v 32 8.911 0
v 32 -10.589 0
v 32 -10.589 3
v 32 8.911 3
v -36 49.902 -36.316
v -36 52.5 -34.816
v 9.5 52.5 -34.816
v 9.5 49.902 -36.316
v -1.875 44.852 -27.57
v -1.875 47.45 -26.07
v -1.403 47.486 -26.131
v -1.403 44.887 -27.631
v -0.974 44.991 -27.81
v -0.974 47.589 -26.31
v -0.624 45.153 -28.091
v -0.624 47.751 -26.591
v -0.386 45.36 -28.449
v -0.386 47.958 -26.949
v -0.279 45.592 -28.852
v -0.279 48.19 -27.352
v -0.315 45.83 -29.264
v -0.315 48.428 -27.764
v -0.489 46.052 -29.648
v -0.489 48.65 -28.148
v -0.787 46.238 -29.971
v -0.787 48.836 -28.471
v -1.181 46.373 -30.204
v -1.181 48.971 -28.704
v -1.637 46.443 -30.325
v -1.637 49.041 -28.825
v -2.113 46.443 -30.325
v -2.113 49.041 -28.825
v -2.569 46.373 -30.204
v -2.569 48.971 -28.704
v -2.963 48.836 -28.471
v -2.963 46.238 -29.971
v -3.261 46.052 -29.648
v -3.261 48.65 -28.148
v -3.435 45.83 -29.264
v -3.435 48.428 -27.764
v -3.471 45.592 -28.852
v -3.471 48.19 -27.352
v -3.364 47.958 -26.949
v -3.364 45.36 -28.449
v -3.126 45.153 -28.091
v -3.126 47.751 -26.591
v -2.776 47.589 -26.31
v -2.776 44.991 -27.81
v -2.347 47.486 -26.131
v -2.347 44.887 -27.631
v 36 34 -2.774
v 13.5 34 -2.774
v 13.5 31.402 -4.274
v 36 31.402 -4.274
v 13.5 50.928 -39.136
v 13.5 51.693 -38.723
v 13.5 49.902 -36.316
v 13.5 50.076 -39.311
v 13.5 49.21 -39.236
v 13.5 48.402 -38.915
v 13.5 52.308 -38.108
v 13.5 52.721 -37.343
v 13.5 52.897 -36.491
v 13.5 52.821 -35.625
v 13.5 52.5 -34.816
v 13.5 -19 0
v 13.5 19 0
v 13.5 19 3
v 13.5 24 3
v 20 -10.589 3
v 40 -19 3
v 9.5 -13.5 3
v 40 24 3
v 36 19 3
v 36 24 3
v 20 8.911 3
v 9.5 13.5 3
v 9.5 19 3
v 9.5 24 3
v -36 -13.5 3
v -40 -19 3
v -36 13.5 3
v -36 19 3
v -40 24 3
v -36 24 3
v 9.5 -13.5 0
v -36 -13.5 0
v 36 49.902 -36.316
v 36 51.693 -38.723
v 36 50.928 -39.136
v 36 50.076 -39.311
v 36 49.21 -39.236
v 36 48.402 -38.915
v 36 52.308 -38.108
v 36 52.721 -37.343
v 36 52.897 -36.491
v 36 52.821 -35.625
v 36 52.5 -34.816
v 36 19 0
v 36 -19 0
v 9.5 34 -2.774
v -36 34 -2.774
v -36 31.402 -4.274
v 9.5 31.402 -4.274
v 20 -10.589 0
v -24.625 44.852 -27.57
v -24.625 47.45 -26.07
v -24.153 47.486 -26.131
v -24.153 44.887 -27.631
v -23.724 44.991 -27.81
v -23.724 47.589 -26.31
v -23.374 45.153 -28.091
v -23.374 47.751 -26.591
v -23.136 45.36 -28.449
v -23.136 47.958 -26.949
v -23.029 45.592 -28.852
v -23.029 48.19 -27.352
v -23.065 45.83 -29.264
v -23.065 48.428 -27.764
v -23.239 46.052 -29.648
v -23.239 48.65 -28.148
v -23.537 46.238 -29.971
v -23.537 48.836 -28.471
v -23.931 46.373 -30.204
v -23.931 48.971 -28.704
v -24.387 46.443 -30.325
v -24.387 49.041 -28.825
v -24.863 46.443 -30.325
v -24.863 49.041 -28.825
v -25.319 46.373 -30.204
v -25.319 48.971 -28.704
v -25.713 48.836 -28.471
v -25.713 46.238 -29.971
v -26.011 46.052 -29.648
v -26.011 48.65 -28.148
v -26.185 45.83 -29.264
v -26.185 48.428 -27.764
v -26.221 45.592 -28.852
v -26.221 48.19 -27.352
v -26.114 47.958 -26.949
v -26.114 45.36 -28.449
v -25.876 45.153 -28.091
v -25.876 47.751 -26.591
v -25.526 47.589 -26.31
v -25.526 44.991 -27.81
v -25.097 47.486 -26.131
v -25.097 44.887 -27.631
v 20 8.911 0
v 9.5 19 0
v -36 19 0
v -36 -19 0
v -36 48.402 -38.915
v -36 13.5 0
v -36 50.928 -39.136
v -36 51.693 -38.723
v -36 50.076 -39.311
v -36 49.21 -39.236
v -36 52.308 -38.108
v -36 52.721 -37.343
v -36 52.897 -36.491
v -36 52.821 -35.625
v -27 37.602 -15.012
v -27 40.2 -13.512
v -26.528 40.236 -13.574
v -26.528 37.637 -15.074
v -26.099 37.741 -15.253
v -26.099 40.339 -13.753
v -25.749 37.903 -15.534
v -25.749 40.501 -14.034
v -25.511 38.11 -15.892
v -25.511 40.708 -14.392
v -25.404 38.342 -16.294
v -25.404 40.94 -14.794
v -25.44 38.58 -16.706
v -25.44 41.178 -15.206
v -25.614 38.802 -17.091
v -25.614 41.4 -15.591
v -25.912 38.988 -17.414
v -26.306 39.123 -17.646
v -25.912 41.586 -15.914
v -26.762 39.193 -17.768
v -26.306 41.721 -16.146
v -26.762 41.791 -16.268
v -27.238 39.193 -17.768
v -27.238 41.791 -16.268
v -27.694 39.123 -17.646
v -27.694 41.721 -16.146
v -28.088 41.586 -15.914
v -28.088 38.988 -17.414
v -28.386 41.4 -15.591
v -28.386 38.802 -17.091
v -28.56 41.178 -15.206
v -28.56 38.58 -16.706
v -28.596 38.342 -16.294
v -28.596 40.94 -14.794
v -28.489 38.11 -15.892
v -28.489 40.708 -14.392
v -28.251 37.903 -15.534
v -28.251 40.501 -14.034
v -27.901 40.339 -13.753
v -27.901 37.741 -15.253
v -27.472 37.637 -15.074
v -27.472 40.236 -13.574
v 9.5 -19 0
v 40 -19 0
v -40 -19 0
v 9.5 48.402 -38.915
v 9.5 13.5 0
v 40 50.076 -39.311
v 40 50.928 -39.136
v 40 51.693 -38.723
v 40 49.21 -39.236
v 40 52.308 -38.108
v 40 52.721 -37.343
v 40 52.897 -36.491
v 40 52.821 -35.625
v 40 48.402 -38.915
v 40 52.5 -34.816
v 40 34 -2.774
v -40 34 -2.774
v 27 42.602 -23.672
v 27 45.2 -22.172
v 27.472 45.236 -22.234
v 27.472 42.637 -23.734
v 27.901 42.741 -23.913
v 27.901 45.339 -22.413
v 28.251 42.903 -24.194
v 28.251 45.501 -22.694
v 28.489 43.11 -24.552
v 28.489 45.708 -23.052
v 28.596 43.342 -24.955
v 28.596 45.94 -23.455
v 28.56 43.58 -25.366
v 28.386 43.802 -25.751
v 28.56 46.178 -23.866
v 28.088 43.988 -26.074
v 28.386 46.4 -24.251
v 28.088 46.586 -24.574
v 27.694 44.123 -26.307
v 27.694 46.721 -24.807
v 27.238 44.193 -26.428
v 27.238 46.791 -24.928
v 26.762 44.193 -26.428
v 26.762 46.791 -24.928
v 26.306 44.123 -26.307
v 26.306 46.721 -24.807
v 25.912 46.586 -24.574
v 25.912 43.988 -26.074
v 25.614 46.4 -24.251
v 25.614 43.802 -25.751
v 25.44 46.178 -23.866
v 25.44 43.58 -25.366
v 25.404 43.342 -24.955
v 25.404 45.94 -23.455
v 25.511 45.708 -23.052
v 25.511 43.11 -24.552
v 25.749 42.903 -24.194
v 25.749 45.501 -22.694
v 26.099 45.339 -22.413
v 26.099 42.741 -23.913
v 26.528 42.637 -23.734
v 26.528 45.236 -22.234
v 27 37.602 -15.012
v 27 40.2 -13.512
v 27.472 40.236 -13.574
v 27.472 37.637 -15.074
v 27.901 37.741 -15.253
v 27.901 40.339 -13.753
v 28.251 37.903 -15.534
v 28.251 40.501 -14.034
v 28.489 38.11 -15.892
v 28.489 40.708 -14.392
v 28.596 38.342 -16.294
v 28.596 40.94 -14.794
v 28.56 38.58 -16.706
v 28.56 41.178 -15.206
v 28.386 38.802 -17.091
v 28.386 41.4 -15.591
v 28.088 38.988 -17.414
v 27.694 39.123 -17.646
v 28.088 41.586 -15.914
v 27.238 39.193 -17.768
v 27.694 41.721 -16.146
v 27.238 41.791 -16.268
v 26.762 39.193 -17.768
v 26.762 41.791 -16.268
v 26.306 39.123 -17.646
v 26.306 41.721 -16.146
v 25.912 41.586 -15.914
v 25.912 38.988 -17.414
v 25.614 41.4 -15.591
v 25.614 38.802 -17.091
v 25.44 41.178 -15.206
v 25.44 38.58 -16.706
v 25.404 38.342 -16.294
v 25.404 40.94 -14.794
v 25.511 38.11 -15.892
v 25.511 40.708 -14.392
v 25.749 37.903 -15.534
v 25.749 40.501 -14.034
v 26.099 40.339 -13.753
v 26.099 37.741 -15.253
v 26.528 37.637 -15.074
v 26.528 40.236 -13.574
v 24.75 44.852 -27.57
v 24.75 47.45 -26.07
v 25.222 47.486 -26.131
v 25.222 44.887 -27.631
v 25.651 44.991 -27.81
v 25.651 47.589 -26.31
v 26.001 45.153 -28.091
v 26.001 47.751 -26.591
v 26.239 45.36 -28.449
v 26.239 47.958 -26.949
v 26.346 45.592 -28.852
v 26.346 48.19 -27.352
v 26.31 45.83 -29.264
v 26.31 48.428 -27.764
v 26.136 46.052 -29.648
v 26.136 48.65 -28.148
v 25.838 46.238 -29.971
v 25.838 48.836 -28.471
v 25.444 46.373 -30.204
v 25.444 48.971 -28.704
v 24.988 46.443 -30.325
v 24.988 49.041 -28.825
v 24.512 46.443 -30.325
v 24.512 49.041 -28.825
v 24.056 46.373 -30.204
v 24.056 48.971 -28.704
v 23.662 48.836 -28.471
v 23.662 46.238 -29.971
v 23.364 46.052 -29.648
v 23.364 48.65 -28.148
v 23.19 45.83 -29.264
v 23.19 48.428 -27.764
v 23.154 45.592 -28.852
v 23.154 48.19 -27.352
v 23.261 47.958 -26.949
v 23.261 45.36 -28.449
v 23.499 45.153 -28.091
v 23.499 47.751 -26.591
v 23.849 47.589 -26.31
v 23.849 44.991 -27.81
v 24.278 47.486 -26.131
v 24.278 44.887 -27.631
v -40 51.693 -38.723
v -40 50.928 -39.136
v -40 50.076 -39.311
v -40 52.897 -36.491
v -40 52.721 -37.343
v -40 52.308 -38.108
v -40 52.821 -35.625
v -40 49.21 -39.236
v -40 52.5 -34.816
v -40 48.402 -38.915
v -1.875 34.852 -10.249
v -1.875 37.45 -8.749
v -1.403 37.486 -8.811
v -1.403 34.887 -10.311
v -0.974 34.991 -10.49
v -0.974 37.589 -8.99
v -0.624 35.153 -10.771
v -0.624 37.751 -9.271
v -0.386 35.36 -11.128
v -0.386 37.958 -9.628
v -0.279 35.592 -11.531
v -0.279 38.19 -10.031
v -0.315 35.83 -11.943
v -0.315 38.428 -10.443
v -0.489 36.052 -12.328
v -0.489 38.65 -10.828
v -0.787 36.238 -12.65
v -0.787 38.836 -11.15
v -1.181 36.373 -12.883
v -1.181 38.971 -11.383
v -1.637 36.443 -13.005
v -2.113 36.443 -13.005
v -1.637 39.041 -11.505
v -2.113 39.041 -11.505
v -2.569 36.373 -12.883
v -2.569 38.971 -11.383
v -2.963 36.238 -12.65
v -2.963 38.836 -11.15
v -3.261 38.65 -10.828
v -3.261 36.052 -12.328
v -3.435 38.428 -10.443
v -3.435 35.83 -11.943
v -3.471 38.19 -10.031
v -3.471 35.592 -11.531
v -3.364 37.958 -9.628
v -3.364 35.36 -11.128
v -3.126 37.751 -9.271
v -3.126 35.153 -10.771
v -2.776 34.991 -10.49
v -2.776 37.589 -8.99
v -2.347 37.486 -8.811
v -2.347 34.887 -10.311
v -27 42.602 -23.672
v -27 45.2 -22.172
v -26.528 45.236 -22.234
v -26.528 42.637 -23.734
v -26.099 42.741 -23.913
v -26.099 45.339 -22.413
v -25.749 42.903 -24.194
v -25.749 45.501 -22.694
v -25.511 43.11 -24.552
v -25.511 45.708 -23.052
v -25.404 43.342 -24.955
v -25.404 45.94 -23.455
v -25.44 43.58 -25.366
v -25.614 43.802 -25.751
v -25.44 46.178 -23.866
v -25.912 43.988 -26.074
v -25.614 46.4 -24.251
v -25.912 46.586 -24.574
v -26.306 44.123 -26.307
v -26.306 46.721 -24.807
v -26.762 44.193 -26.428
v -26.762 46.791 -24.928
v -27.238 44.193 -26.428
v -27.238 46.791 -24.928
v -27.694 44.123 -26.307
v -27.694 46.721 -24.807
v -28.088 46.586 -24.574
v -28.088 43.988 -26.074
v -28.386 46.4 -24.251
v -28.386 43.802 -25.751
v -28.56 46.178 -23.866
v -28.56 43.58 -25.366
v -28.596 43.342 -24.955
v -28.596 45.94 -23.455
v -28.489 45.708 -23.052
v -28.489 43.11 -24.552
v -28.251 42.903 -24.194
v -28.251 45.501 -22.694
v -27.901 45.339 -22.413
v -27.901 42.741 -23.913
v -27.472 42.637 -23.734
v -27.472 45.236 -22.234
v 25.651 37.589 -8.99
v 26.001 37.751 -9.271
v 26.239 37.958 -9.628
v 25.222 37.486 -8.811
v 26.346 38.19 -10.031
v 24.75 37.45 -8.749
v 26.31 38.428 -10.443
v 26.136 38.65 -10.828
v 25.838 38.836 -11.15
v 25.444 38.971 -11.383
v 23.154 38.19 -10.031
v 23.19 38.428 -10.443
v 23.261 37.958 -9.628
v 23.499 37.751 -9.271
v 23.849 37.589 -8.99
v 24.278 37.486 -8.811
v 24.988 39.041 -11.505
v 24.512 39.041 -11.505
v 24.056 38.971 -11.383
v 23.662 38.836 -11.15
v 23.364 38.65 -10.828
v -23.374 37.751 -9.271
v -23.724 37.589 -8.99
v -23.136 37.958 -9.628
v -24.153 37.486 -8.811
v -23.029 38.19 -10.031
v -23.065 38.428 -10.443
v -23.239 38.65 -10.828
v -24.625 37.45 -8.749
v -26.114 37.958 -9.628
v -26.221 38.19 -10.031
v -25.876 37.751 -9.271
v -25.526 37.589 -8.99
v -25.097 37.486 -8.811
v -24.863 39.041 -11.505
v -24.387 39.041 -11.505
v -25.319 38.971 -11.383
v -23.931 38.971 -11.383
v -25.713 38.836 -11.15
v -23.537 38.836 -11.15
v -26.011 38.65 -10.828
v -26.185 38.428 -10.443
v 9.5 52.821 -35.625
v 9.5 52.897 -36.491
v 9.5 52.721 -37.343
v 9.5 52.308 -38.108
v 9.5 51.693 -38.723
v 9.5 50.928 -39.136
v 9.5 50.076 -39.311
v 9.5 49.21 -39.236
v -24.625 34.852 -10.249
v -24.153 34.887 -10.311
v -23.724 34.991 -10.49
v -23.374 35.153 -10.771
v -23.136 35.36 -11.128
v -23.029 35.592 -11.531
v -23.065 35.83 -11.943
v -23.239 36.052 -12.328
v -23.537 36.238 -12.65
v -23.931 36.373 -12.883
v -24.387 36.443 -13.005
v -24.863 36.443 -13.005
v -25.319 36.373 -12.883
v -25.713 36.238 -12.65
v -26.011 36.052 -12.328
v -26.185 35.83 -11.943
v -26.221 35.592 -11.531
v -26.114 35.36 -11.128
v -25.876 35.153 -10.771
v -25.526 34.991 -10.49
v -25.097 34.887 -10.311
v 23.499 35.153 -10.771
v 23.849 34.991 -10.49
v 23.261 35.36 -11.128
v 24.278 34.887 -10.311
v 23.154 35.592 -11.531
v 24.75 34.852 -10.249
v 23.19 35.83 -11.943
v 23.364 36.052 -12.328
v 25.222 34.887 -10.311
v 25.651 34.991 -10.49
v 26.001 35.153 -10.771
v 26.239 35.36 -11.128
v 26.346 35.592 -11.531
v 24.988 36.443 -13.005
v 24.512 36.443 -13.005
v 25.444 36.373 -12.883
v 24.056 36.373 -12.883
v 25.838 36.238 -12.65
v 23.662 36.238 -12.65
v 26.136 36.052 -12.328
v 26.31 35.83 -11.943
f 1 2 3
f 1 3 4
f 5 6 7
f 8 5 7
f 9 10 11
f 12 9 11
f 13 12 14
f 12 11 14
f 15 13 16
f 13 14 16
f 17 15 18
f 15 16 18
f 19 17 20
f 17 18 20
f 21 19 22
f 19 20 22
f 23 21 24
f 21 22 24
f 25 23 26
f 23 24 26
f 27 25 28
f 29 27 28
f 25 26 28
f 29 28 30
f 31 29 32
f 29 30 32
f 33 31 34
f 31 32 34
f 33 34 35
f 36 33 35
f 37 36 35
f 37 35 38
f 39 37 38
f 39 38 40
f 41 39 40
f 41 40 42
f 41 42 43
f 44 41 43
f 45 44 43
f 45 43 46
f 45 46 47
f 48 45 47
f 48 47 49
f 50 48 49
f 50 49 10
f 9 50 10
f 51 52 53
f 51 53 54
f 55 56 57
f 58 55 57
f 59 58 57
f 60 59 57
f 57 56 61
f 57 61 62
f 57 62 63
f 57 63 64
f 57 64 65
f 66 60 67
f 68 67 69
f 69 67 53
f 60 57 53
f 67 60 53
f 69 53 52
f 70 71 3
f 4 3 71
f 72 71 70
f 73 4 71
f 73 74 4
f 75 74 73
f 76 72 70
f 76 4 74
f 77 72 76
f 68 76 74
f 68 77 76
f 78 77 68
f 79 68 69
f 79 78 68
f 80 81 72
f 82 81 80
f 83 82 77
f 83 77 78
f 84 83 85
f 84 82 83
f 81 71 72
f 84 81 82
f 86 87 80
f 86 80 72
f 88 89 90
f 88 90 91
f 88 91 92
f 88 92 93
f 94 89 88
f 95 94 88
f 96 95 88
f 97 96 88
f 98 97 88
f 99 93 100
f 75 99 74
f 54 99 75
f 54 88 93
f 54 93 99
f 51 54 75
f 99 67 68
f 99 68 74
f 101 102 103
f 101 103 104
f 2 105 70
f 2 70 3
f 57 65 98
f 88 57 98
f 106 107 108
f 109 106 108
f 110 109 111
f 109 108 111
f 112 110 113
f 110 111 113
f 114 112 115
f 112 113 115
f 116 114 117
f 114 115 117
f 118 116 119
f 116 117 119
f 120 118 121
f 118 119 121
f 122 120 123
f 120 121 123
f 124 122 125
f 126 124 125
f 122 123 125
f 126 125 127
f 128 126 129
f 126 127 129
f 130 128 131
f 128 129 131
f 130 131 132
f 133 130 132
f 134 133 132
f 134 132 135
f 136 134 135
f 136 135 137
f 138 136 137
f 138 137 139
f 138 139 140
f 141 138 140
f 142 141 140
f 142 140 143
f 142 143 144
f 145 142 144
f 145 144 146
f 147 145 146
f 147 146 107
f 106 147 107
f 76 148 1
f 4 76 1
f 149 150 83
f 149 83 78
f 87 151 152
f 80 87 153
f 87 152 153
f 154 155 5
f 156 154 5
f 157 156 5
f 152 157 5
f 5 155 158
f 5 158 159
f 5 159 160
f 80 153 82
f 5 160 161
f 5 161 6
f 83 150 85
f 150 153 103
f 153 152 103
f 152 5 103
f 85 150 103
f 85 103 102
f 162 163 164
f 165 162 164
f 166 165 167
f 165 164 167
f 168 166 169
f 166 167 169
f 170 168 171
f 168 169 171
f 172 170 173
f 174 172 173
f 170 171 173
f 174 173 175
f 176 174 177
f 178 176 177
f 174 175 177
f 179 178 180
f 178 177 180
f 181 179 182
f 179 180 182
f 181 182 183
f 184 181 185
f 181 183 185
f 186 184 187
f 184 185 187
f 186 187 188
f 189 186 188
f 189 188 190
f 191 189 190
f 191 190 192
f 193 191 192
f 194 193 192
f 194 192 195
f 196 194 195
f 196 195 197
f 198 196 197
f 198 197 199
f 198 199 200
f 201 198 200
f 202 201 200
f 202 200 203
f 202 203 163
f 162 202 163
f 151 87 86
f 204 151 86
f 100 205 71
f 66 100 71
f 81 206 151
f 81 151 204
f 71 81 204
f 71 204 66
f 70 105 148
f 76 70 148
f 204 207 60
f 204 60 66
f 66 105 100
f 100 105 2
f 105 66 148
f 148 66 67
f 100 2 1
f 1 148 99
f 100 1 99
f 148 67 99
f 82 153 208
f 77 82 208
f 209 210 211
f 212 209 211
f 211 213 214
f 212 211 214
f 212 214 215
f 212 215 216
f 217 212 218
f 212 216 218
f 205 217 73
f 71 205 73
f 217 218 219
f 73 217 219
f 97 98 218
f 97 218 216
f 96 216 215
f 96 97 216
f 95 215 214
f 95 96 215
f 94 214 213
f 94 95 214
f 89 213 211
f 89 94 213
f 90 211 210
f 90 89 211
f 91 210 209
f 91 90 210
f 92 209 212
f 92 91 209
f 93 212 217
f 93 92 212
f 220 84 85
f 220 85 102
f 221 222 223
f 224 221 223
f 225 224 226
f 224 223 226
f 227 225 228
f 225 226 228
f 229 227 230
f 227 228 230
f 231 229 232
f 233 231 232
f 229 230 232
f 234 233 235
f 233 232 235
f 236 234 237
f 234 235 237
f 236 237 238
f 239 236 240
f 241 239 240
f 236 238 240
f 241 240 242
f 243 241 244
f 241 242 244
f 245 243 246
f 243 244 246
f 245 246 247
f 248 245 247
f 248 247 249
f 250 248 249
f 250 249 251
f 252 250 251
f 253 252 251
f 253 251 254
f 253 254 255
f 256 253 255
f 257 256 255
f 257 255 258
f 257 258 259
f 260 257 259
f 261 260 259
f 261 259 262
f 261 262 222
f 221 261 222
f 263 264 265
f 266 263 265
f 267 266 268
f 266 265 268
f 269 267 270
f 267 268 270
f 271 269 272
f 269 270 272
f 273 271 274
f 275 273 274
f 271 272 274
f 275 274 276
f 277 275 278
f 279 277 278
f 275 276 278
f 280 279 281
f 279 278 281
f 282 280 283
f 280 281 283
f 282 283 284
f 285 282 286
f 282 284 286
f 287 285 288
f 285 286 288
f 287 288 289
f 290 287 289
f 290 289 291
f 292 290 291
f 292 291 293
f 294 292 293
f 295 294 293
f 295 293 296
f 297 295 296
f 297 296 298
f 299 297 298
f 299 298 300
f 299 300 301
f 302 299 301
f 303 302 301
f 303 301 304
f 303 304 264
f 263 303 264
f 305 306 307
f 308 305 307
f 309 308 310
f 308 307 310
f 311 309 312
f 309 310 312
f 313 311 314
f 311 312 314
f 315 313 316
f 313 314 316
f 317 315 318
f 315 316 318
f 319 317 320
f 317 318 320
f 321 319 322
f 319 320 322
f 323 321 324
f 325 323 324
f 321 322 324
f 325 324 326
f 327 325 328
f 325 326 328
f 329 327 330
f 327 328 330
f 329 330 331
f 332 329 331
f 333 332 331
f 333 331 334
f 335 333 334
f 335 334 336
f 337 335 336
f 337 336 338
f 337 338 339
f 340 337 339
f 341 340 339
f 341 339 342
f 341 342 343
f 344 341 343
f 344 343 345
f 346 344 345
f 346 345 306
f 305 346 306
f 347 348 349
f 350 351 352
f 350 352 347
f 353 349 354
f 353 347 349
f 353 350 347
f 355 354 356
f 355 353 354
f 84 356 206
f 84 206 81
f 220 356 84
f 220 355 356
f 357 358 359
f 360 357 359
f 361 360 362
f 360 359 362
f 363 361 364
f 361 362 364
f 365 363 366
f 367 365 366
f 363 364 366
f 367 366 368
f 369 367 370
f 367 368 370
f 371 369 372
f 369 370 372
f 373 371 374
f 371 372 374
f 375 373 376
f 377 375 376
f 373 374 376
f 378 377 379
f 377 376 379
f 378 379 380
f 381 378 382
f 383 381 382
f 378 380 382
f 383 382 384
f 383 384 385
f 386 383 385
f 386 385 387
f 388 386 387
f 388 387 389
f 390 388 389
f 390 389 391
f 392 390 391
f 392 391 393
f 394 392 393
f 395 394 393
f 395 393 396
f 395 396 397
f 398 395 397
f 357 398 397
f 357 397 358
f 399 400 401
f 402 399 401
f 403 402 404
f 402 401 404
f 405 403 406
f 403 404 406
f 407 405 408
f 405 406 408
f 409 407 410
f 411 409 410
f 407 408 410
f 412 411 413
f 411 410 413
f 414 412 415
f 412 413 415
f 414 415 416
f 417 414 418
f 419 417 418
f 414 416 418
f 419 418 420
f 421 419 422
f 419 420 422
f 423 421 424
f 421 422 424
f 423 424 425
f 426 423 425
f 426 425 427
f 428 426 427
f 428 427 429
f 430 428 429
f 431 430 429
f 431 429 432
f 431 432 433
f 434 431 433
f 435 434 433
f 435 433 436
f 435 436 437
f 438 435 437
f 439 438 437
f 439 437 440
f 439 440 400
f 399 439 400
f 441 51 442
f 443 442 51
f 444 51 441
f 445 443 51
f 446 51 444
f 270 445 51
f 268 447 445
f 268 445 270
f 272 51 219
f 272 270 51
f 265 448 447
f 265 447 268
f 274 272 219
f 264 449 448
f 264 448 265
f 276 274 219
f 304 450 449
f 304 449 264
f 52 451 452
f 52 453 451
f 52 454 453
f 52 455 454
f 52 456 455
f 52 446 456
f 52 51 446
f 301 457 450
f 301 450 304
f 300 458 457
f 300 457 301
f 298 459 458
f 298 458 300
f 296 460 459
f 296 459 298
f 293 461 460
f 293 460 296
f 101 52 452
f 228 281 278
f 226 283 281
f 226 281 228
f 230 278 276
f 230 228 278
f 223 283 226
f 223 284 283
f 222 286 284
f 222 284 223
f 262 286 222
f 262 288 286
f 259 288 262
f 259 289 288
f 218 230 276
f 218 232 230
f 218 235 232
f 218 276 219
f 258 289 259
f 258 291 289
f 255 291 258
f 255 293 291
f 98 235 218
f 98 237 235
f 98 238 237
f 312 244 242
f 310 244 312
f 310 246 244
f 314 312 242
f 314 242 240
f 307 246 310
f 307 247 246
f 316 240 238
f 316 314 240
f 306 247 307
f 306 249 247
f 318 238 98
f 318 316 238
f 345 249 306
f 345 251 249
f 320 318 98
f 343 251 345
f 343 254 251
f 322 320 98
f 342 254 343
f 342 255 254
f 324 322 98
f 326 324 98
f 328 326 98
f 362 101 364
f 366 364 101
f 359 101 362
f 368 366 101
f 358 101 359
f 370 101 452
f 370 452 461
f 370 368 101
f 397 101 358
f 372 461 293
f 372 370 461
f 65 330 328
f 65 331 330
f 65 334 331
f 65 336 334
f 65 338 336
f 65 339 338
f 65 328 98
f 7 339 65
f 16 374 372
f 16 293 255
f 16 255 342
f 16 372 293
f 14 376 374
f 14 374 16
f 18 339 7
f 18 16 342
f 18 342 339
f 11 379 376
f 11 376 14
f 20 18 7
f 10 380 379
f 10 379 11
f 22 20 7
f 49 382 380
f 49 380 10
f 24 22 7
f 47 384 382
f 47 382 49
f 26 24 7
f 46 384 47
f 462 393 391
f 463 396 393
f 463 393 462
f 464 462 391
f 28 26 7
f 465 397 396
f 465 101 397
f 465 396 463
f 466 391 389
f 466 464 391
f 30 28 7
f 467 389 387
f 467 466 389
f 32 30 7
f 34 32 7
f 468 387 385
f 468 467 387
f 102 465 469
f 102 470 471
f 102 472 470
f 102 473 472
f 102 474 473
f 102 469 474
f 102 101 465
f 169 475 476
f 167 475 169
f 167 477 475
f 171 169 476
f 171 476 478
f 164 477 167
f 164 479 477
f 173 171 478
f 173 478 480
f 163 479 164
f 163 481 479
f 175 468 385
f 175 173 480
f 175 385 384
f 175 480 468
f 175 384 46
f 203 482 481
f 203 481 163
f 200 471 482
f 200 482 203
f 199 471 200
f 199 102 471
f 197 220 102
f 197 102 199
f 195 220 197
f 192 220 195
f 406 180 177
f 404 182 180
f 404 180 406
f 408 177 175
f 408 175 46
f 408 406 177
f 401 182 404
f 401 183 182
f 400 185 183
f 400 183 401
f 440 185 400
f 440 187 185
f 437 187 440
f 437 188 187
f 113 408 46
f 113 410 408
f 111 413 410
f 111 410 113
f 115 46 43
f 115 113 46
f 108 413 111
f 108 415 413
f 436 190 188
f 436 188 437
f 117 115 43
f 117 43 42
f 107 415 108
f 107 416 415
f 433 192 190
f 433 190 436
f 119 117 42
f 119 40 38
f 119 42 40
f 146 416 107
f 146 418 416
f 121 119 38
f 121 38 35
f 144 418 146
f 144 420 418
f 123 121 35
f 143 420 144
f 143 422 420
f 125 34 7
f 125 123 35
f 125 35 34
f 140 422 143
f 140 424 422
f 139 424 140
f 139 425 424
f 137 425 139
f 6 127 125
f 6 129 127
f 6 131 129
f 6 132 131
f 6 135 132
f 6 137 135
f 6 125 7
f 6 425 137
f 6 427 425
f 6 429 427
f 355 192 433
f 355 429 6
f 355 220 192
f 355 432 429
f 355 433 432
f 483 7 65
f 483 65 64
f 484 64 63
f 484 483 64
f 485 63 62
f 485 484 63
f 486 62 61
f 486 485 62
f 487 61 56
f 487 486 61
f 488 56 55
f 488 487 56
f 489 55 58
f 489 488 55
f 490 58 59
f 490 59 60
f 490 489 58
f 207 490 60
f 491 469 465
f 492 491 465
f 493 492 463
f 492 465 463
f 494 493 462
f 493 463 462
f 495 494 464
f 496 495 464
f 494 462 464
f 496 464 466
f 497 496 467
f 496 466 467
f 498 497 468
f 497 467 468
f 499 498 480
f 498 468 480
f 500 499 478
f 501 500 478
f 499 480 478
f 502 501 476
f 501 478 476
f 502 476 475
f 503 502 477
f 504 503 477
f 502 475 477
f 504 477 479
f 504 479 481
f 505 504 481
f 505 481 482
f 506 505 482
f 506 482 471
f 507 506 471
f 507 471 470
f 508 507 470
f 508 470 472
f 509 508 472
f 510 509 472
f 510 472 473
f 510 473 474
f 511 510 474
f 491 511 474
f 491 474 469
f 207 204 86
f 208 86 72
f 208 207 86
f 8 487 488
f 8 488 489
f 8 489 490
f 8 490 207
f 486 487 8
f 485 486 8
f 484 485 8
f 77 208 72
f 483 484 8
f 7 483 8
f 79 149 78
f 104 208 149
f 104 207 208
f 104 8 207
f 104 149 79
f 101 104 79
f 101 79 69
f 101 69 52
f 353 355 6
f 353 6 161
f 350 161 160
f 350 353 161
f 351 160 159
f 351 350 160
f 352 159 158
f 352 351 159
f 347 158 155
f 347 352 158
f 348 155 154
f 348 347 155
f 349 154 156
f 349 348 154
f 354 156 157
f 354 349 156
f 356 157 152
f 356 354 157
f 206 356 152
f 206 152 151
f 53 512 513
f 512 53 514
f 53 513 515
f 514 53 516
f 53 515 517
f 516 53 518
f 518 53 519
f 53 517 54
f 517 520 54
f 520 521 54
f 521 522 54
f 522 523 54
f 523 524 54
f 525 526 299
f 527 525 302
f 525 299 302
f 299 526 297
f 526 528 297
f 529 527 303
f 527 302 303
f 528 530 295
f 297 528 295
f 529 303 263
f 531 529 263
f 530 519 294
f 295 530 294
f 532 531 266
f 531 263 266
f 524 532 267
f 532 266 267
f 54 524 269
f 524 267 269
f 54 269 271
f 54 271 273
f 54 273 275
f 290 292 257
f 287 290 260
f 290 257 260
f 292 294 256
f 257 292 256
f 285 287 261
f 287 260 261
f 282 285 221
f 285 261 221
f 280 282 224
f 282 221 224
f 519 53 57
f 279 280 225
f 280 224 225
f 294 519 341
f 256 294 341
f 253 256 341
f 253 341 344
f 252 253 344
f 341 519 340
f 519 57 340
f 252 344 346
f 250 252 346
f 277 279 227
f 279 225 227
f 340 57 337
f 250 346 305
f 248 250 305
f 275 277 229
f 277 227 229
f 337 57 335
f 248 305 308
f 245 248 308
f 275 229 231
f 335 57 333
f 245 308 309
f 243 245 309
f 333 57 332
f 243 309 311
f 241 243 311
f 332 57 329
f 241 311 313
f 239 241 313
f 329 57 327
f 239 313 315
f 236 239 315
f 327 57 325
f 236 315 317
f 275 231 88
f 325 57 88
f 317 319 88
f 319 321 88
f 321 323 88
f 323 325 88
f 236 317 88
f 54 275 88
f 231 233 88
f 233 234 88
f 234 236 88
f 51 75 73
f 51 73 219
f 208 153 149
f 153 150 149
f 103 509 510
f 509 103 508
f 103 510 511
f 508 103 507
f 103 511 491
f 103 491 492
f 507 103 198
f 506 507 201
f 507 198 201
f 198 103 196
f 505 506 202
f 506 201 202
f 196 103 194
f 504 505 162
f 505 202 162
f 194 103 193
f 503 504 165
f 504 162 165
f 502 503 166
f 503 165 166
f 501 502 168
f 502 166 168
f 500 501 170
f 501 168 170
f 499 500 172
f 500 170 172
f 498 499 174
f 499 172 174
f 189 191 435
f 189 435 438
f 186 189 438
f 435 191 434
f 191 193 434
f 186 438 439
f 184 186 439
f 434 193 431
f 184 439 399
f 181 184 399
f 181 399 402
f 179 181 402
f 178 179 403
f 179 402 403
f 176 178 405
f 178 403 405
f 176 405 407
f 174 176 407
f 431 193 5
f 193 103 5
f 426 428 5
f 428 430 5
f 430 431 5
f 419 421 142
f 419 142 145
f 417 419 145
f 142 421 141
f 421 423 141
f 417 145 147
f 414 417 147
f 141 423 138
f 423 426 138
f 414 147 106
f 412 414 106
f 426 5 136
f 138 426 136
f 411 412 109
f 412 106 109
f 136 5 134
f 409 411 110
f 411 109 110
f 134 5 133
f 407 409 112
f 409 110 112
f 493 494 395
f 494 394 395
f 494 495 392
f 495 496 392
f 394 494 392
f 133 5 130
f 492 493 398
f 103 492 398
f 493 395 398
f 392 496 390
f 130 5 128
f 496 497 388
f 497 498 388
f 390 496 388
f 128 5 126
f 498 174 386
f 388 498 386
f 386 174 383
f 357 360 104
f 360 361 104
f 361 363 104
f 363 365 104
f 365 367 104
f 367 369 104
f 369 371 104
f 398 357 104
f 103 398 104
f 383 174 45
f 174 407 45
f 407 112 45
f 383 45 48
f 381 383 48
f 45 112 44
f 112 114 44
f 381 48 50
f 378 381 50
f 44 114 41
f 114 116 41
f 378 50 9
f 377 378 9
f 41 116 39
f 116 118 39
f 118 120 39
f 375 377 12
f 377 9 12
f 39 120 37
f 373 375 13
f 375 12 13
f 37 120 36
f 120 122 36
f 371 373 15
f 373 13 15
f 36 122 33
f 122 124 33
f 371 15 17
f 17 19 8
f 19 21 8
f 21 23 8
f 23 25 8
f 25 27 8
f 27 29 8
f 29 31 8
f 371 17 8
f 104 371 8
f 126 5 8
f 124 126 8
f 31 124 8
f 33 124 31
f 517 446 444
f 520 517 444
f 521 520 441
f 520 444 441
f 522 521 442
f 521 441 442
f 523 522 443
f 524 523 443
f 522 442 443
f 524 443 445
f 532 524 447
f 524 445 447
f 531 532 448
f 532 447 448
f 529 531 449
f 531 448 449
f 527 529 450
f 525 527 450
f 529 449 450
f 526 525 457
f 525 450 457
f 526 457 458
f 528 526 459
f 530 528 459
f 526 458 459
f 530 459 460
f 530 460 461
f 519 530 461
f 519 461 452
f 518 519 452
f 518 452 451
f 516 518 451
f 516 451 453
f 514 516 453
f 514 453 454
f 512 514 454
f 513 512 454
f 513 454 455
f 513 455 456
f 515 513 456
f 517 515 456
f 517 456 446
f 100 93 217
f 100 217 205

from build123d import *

# Parameters (mm, degrees)
SKETCH_1_W          = 80
SKETCH_1_H          = 38
SKETCH_1_W_2        = 45.5
SKETCH_1_H_2        = 27
SKETCH_1_W_3        = 12
SKETCH_1_H_3        = 19.5
EXTRUDE_1_DEPTH     = 3
EXTRUDE_2_DEPTH     = 4
EXTRUDE_START       = -49.5
EXTRUDE_3_DEPTH     = 4
EXTRUDE_START_2     = -76
EXTRUDE_4_DEPTH     = 4
SKETCH_6_W          = 80
SKETCH_6_H          = 37
EXTRUDE_5_DEPTH     = 3
SKETCH_7_R          = 1.6
CUT_EXTRUDE_1_DEPTH = 80.501880139


with BuildPart() as part:
    # 草图1 → 凸台-拉伸1 (new body)
    with BuildSketch(Plane.XY):
        Rectangle(SKETCH_1_W, SKETCH_1_H)
        with Locations((-13.25, 0)):
            Rectangle(SKETCH_1_W_2, SKETCH_1_H_2, mode=Mode.SUBTRACT)
        with Locations((26, -0.838945713)):
            Rectangle(SKETCH_1_W_3, SKETCH_1_H_3, mode=Mode.SUBTRACT)
    extrude(amount=EXTRUDE_1_DEPTH)

    # 草图3 → 凸台-拉伸2 (add)
    with BuildSketch(Plane.ZY.offset(40)):
        with BuildLine():
            Line((3, 19), (3, 24))
            Line((3, 24), (-2.773502692, 34))
            Line((-2.773502692, 34), (-34.816442632, 52.5))
            ThreePointArc((-34.816442632, 52.5), (-38.437762975, 52.023244132), (-38.914518843, 48.401923789))
            Line((-38.914518843, 48.401923789), (0, -19))
            Line((0, -19), (0, 19))
            Line((0, 19), (3, 19))
        make_face()
    extrude(amount=-EXTRUDE_2_DEPTH)

    # 草图4 → 凸台-拉伸3 (add)
    with BuildSketch(Plane.ZY.offset(40).offset(EXTRUDE_START)):
        with BuildLine():
            Line((-38.914518843, 48.401923789), (0, -19))
            Line((0, -19), (3, -19))
            Line((3, -19), (3, 24))
            Line((3, 24), (-2.773502692, 34))
            Line((-2.773502692, 34), (-34.816442632, 52.5))
            ThreePointArc((-34.816442632, 52.5), (-38.437762975, 52.023244132), (-38.914518843, 48.401923789))
        make_face()
    extrude(amount=-EXTRUDE_3_DEPTH)

    # 草图5 → 凸台-拉伸4 (add)
    with BuildSketch(Plane.ZY.offset(40).offset(EXTRUDE_START_2)):
        with BuildLine():
            Line((-38.914518843, 48.401923789), (0, -19))
            Line((0, -19), (3, -19))
            Line((3, -19), (3, 24))
            Line((3, 24), (-2.773502692, 34))
            Line((-2.773502692, 34), (-34.816442632, 52.5))
            ThreePointArc((-34.816442632, 52.5), (-38.437762975, 52.023244132), (-38.914518843, 48.401923789))
        make_face()
    extrude(amount=-EXTRUDE_4_DEPTH)

    # 草图6 → 凸台-拉伸5 (add)
    with BuildSketch(Plane(origin=(0, 24.299038106, 14.029056191), x_dir=(1, 0, 0), z_dir=(0, 0.86602540378444, 0.4999999999999976))):
        with Locations((0, 37.901923789)):
            Rectangle(SKETCH_6_W, SKETCH_6_H)
    extrude(amount=-EXTRUDE_5_DEPTH)

    # 草图7 → 切除-拉伸1 (cut, through all)
    with BuildSketch(Plane(origin=(0, 24.299038106, 14.029056191), x_dir=(1, 0, 0), z_dir=(0, 0.86602540378444, 0.4999999999999975))):
        with Locations(Location((-24.625, 47.901923789, 0), (0, 0, 270))):
            Circle(SKETCH_7_R)
        with Locations(Location((-1.875, 47.901923789, 0), (0, 0, 270))):
            Circle(SKETCH_7_R)
        with Locations(Location((-1.875, 27.901923789, 0), (0, 0, 270))):
            Circle(SKETCH_7_R)
        with Locations(Location((-24.625, 27.901923789, 0), (0, 0, 270))):
            Circle(SKETCH_7_R)
        with Locations(Location((24.75, 47.901923789, 0), (0, 0, 270))):
            Circle(SKETCH_7_R)
        with Locations(Location((24.75, 27.901923789, 0), (0, 0, 270))):
            Circle(SKETCH_7_R)
        with Locations(Location((-27, 33.401923789, 0), (0, 0, 270))):
            Circle(SKETCH_7_R)
        with Locations(Location((27, 33.401923789, 0), (0, 0, 270))):
            Circle(SKETCH_7_R)
        with Locations(Location((-27, 43.401923789, 0), (0, 0, 270))):
            Circle(SKETCH_7_R)
        with Locations(Location((27, 43.401923789, 0), (0, 0, 270))):
            Circle(SKETCH_7_R)
    extrude(amount=-CUT_EXTRUDE_1_DEPTH, mode=Mode.SUBTRACT)


solid = part.part
